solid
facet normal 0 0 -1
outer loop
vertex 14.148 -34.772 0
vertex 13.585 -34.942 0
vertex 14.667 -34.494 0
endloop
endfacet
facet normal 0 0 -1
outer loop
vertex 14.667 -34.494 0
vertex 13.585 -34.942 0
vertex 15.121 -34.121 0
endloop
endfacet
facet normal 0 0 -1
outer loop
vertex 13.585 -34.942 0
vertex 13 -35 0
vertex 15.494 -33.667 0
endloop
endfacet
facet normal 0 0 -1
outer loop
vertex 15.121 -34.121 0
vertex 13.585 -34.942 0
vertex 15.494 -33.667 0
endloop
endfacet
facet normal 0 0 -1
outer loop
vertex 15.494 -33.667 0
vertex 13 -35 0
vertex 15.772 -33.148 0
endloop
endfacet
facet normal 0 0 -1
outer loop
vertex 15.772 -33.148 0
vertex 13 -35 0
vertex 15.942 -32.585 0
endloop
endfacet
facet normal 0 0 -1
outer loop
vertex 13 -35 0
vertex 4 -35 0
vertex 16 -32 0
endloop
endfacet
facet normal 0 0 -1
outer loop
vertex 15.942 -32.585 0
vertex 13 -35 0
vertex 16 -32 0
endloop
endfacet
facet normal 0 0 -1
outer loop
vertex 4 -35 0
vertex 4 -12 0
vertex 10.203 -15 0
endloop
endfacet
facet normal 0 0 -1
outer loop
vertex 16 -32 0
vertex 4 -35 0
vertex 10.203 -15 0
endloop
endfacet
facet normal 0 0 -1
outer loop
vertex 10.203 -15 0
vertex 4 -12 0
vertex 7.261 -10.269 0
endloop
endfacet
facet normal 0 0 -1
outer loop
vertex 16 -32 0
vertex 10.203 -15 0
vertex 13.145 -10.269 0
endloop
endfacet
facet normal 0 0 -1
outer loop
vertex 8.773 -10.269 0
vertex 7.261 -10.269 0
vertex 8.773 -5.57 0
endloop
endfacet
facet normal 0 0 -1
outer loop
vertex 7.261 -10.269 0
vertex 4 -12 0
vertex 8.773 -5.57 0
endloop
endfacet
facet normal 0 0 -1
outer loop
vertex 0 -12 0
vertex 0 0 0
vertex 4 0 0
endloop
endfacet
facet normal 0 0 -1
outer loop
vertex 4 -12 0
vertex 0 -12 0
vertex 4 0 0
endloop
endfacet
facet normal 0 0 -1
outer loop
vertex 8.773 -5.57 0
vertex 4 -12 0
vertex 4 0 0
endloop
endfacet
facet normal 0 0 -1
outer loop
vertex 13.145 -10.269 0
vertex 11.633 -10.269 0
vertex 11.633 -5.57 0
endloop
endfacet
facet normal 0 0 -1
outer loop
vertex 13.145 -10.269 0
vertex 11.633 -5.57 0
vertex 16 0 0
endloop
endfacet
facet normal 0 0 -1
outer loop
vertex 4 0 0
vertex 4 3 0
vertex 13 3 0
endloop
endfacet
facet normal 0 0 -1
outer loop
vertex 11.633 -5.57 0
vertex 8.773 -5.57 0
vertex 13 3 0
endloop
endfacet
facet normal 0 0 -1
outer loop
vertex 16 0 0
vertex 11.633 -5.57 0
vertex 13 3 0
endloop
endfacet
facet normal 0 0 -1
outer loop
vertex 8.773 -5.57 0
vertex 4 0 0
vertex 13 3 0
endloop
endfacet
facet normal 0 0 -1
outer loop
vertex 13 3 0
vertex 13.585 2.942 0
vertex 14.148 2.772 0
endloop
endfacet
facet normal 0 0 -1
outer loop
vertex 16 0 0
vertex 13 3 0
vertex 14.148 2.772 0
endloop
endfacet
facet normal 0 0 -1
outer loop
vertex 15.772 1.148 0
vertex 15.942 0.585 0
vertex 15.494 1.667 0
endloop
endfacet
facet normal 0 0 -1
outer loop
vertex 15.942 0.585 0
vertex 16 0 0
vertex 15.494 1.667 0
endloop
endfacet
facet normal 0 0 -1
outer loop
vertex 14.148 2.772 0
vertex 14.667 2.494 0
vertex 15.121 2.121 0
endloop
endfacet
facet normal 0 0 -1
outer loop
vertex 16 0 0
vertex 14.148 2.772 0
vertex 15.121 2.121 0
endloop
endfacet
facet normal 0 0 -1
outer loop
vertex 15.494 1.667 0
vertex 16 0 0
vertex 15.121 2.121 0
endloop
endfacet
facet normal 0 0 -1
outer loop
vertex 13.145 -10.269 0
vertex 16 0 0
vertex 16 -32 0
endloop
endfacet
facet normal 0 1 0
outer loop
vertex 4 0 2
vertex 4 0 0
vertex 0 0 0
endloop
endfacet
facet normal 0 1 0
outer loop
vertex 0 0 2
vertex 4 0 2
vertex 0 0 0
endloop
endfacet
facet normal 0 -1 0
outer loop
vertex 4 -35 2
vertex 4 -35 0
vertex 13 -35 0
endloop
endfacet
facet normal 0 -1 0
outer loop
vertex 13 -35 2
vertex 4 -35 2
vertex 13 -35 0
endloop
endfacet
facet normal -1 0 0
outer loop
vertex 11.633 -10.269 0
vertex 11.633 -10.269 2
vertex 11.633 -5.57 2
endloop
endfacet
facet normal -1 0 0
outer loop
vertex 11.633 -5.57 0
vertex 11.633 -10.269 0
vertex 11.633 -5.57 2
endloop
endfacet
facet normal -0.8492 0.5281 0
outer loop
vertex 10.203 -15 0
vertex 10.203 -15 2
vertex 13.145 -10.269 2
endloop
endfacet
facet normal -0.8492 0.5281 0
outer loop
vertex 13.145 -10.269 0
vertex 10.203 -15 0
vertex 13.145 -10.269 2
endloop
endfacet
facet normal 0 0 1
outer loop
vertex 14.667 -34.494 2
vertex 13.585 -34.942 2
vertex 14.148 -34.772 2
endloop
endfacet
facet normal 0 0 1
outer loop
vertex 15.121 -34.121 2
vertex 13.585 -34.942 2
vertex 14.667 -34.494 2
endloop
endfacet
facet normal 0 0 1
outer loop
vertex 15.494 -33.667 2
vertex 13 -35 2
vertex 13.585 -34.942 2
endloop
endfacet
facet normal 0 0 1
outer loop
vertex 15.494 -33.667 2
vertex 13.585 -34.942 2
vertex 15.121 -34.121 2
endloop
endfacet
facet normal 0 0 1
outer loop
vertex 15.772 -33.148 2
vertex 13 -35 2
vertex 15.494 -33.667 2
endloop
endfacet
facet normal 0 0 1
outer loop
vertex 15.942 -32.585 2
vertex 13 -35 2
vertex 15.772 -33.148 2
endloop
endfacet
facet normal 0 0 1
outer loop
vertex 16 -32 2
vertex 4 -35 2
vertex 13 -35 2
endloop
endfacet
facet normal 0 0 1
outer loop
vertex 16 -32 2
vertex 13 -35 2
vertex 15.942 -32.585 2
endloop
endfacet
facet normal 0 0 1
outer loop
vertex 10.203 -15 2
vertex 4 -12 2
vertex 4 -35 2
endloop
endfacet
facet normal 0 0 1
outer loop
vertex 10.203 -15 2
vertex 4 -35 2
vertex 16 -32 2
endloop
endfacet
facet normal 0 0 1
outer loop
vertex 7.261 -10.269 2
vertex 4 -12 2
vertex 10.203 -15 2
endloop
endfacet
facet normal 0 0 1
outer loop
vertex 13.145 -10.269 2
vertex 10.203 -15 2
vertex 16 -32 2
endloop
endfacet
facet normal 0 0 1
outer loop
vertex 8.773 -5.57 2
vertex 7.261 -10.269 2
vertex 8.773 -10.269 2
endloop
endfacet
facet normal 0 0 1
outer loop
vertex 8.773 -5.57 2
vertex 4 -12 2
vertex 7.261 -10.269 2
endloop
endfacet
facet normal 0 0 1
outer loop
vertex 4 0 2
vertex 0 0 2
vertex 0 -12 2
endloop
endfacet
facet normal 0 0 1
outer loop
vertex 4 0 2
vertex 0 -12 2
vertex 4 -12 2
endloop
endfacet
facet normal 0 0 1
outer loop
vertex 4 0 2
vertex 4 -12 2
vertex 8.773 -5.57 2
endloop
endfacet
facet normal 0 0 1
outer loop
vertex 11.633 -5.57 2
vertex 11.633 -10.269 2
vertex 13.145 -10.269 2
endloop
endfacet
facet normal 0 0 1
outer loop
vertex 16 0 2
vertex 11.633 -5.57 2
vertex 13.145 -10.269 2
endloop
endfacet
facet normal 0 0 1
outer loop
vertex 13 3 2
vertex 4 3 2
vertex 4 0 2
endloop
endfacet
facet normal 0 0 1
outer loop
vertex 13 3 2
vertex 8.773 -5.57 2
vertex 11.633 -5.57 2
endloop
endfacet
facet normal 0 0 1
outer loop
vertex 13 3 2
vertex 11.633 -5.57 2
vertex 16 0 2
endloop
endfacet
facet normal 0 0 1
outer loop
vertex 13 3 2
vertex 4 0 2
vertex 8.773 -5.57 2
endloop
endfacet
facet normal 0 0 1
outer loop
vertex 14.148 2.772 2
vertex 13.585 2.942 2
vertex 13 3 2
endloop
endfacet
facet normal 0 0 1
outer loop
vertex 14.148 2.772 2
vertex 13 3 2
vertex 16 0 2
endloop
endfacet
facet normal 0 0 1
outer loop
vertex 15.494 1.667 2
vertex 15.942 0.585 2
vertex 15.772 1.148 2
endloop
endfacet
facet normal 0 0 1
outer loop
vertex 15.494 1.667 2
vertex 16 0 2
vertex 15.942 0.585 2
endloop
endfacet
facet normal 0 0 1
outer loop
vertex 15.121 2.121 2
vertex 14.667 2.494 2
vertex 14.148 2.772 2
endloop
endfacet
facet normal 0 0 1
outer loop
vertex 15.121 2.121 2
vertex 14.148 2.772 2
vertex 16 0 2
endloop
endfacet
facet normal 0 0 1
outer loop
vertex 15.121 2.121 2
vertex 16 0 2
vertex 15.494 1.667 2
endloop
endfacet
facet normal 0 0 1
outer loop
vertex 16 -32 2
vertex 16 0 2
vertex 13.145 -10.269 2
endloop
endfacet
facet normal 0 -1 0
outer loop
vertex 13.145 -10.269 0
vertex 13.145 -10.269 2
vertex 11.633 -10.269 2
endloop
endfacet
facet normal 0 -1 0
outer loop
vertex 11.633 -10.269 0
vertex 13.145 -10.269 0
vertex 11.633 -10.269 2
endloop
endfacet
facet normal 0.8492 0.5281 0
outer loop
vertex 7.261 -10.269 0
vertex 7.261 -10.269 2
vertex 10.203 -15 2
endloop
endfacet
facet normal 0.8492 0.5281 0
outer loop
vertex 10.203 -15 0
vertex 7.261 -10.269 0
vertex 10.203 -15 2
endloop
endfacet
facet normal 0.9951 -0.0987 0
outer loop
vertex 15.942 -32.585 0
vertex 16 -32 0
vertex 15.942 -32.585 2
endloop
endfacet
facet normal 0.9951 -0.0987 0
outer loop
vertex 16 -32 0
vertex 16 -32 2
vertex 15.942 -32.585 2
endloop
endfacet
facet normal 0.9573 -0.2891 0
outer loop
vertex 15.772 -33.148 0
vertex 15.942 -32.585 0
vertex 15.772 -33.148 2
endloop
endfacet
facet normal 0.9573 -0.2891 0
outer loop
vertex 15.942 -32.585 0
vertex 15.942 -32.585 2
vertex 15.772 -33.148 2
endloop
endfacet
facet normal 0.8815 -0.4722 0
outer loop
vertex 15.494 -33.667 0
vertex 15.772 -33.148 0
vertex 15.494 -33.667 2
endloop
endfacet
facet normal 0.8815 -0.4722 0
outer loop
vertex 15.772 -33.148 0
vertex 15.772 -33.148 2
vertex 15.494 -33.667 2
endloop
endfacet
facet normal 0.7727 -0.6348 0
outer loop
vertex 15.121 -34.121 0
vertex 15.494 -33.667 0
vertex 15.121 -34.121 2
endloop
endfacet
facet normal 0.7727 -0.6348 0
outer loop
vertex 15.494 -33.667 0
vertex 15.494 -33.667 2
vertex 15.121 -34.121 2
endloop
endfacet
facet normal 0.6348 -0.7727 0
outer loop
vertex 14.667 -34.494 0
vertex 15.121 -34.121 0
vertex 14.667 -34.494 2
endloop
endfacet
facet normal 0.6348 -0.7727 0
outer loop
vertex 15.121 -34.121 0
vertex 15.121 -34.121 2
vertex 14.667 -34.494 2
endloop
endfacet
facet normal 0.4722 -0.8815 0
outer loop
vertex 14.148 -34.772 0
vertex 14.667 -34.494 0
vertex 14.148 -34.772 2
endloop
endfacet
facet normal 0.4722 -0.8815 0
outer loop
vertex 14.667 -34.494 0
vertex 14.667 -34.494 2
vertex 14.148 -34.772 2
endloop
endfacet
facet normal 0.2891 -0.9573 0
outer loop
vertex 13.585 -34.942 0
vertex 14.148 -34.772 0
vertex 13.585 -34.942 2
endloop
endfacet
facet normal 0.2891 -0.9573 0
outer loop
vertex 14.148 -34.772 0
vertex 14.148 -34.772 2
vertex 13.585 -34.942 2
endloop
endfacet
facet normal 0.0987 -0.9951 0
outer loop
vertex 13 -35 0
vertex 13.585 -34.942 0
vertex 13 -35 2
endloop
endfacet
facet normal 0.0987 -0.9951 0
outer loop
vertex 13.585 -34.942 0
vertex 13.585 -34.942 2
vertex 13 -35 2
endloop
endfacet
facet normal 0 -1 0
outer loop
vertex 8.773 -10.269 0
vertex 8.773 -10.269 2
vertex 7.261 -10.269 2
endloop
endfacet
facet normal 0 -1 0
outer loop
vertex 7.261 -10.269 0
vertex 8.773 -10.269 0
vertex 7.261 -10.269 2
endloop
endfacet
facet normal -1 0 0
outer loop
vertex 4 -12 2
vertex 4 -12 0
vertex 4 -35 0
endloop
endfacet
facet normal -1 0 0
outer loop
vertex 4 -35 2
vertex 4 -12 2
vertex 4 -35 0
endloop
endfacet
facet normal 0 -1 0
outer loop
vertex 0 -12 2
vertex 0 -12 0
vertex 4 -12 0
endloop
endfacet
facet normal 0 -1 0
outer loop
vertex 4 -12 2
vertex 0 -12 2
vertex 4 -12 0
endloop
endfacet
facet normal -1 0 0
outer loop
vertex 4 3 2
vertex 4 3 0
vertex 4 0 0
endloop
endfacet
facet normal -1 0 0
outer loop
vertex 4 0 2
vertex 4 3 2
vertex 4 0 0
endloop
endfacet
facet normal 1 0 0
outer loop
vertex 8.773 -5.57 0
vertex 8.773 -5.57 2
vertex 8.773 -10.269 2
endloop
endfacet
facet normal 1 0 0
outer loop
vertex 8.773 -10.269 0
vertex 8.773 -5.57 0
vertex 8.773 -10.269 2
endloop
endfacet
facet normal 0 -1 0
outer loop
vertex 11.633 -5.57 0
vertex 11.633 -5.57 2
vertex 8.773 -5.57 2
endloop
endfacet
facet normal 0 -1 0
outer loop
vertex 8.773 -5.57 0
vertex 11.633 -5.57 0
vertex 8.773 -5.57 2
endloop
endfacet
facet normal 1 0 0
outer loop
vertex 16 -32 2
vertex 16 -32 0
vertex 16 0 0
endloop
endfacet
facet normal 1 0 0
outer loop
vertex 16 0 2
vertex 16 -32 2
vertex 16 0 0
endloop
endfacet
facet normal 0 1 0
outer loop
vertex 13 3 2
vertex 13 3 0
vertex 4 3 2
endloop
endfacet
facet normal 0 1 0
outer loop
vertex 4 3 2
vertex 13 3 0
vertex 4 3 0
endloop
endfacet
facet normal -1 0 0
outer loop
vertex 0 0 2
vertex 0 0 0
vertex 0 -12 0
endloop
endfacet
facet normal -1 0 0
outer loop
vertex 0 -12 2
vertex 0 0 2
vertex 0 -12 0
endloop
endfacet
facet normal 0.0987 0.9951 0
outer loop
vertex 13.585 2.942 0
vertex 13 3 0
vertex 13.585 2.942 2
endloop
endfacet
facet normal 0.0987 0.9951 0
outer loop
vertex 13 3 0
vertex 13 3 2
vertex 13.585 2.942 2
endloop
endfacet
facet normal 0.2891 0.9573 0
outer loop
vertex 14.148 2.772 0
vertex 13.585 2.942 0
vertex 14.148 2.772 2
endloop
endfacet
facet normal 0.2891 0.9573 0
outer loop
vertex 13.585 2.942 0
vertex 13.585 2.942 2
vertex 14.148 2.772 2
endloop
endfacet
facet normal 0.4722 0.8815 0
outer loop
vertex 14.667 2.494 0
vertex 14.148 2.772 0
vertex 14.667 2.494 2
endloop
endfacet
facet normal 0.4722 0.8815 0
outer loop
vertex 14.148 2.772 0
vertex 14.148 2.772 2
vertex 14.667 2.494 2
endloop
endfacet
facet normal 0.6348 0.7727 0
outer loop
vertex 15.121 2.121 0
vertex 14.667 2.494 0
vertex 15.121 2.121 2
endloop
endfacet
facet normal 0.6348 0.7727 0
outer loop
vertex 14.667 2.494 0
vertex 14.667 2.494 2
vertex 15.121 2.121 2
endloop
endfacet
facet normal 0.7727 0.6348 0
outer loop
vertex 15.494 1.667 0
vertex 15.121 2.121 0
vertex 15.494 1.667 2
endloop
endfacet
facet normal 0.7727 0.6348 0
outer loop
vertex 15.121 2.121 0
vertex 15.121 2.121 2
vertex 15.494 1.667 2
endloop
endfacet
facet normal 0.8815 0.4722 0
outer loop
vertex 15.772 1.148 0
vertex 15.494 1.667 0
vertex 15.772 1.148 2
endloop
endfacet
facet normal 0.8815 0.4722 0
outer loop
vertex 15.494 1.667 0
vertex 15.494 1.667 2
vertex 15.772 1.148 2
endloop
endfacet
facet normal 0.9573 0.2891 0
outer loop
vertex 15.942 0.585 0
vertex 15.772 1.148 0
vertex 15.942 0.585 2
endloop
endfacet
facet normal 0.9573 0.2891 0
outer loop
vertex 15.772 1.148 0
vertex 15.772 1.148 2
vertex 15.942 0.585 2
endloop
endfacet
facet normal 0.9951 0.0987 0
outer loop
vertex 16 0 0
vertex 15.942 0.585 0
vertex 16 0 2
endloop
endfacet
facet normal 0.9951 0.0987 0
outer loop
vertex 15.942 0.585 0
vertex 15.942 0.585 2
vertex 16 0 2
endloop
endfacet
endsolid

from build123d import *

# Parameters (mm, degrees)
SKETCH_1_W          = 12
SKETCH_1_H          = 10
EXTRUDE_1_DEPTH     = 2
CUT_EXTRUDE_1_DEPTH = 2
FILLET_1_R          = 3


with BuildPart() as part:
    # ｽｹｯﾁ1 → ﾎﾞｽ - 押し出し1 (new body)
    with BuildSketch(Plane.XY):
        Polygon((4, 0), (0, 0), (0, -12), (4, -12), (4, -25), (16, -25), (16, 3), (4, 3), align=None)
        with Locations((10, -30)):
            Rectangle(SKETCH_1_W, SKETCH_1_H)
    extrude(amount=EXTRUDE_1_DEPTH)

    # ｽｹｯﾁ2 → ｶｯﾄ - 押し出し1 (cut)
    with BuildSketch(Plane.XY.offset(2)):
        Polygon((11.632823949, -5.570087609), (8.772941266, -5.570087609), (8.772941266, -10.268637818), (7.260776917, -10.268637818), (10.202882607, -14.99997105), (13.144988298, -10.268637818), (11.632823949, -10.268637818), align=None)
    extrude(amount=-CUT_EXTRUDE_1_DEPTH, mode=Mode.SUBTRACT)

    # ﾌｨﾚｯﾄ1
    fillet_1_edges = [part.edges().sort_by_distance(p)[0] for p in [
        (16, 3, 1),
        (16, -35, 1),
    ]]
    fillet(fillet_1_edges, radius=FILLET_1_R)


solid = part.part
